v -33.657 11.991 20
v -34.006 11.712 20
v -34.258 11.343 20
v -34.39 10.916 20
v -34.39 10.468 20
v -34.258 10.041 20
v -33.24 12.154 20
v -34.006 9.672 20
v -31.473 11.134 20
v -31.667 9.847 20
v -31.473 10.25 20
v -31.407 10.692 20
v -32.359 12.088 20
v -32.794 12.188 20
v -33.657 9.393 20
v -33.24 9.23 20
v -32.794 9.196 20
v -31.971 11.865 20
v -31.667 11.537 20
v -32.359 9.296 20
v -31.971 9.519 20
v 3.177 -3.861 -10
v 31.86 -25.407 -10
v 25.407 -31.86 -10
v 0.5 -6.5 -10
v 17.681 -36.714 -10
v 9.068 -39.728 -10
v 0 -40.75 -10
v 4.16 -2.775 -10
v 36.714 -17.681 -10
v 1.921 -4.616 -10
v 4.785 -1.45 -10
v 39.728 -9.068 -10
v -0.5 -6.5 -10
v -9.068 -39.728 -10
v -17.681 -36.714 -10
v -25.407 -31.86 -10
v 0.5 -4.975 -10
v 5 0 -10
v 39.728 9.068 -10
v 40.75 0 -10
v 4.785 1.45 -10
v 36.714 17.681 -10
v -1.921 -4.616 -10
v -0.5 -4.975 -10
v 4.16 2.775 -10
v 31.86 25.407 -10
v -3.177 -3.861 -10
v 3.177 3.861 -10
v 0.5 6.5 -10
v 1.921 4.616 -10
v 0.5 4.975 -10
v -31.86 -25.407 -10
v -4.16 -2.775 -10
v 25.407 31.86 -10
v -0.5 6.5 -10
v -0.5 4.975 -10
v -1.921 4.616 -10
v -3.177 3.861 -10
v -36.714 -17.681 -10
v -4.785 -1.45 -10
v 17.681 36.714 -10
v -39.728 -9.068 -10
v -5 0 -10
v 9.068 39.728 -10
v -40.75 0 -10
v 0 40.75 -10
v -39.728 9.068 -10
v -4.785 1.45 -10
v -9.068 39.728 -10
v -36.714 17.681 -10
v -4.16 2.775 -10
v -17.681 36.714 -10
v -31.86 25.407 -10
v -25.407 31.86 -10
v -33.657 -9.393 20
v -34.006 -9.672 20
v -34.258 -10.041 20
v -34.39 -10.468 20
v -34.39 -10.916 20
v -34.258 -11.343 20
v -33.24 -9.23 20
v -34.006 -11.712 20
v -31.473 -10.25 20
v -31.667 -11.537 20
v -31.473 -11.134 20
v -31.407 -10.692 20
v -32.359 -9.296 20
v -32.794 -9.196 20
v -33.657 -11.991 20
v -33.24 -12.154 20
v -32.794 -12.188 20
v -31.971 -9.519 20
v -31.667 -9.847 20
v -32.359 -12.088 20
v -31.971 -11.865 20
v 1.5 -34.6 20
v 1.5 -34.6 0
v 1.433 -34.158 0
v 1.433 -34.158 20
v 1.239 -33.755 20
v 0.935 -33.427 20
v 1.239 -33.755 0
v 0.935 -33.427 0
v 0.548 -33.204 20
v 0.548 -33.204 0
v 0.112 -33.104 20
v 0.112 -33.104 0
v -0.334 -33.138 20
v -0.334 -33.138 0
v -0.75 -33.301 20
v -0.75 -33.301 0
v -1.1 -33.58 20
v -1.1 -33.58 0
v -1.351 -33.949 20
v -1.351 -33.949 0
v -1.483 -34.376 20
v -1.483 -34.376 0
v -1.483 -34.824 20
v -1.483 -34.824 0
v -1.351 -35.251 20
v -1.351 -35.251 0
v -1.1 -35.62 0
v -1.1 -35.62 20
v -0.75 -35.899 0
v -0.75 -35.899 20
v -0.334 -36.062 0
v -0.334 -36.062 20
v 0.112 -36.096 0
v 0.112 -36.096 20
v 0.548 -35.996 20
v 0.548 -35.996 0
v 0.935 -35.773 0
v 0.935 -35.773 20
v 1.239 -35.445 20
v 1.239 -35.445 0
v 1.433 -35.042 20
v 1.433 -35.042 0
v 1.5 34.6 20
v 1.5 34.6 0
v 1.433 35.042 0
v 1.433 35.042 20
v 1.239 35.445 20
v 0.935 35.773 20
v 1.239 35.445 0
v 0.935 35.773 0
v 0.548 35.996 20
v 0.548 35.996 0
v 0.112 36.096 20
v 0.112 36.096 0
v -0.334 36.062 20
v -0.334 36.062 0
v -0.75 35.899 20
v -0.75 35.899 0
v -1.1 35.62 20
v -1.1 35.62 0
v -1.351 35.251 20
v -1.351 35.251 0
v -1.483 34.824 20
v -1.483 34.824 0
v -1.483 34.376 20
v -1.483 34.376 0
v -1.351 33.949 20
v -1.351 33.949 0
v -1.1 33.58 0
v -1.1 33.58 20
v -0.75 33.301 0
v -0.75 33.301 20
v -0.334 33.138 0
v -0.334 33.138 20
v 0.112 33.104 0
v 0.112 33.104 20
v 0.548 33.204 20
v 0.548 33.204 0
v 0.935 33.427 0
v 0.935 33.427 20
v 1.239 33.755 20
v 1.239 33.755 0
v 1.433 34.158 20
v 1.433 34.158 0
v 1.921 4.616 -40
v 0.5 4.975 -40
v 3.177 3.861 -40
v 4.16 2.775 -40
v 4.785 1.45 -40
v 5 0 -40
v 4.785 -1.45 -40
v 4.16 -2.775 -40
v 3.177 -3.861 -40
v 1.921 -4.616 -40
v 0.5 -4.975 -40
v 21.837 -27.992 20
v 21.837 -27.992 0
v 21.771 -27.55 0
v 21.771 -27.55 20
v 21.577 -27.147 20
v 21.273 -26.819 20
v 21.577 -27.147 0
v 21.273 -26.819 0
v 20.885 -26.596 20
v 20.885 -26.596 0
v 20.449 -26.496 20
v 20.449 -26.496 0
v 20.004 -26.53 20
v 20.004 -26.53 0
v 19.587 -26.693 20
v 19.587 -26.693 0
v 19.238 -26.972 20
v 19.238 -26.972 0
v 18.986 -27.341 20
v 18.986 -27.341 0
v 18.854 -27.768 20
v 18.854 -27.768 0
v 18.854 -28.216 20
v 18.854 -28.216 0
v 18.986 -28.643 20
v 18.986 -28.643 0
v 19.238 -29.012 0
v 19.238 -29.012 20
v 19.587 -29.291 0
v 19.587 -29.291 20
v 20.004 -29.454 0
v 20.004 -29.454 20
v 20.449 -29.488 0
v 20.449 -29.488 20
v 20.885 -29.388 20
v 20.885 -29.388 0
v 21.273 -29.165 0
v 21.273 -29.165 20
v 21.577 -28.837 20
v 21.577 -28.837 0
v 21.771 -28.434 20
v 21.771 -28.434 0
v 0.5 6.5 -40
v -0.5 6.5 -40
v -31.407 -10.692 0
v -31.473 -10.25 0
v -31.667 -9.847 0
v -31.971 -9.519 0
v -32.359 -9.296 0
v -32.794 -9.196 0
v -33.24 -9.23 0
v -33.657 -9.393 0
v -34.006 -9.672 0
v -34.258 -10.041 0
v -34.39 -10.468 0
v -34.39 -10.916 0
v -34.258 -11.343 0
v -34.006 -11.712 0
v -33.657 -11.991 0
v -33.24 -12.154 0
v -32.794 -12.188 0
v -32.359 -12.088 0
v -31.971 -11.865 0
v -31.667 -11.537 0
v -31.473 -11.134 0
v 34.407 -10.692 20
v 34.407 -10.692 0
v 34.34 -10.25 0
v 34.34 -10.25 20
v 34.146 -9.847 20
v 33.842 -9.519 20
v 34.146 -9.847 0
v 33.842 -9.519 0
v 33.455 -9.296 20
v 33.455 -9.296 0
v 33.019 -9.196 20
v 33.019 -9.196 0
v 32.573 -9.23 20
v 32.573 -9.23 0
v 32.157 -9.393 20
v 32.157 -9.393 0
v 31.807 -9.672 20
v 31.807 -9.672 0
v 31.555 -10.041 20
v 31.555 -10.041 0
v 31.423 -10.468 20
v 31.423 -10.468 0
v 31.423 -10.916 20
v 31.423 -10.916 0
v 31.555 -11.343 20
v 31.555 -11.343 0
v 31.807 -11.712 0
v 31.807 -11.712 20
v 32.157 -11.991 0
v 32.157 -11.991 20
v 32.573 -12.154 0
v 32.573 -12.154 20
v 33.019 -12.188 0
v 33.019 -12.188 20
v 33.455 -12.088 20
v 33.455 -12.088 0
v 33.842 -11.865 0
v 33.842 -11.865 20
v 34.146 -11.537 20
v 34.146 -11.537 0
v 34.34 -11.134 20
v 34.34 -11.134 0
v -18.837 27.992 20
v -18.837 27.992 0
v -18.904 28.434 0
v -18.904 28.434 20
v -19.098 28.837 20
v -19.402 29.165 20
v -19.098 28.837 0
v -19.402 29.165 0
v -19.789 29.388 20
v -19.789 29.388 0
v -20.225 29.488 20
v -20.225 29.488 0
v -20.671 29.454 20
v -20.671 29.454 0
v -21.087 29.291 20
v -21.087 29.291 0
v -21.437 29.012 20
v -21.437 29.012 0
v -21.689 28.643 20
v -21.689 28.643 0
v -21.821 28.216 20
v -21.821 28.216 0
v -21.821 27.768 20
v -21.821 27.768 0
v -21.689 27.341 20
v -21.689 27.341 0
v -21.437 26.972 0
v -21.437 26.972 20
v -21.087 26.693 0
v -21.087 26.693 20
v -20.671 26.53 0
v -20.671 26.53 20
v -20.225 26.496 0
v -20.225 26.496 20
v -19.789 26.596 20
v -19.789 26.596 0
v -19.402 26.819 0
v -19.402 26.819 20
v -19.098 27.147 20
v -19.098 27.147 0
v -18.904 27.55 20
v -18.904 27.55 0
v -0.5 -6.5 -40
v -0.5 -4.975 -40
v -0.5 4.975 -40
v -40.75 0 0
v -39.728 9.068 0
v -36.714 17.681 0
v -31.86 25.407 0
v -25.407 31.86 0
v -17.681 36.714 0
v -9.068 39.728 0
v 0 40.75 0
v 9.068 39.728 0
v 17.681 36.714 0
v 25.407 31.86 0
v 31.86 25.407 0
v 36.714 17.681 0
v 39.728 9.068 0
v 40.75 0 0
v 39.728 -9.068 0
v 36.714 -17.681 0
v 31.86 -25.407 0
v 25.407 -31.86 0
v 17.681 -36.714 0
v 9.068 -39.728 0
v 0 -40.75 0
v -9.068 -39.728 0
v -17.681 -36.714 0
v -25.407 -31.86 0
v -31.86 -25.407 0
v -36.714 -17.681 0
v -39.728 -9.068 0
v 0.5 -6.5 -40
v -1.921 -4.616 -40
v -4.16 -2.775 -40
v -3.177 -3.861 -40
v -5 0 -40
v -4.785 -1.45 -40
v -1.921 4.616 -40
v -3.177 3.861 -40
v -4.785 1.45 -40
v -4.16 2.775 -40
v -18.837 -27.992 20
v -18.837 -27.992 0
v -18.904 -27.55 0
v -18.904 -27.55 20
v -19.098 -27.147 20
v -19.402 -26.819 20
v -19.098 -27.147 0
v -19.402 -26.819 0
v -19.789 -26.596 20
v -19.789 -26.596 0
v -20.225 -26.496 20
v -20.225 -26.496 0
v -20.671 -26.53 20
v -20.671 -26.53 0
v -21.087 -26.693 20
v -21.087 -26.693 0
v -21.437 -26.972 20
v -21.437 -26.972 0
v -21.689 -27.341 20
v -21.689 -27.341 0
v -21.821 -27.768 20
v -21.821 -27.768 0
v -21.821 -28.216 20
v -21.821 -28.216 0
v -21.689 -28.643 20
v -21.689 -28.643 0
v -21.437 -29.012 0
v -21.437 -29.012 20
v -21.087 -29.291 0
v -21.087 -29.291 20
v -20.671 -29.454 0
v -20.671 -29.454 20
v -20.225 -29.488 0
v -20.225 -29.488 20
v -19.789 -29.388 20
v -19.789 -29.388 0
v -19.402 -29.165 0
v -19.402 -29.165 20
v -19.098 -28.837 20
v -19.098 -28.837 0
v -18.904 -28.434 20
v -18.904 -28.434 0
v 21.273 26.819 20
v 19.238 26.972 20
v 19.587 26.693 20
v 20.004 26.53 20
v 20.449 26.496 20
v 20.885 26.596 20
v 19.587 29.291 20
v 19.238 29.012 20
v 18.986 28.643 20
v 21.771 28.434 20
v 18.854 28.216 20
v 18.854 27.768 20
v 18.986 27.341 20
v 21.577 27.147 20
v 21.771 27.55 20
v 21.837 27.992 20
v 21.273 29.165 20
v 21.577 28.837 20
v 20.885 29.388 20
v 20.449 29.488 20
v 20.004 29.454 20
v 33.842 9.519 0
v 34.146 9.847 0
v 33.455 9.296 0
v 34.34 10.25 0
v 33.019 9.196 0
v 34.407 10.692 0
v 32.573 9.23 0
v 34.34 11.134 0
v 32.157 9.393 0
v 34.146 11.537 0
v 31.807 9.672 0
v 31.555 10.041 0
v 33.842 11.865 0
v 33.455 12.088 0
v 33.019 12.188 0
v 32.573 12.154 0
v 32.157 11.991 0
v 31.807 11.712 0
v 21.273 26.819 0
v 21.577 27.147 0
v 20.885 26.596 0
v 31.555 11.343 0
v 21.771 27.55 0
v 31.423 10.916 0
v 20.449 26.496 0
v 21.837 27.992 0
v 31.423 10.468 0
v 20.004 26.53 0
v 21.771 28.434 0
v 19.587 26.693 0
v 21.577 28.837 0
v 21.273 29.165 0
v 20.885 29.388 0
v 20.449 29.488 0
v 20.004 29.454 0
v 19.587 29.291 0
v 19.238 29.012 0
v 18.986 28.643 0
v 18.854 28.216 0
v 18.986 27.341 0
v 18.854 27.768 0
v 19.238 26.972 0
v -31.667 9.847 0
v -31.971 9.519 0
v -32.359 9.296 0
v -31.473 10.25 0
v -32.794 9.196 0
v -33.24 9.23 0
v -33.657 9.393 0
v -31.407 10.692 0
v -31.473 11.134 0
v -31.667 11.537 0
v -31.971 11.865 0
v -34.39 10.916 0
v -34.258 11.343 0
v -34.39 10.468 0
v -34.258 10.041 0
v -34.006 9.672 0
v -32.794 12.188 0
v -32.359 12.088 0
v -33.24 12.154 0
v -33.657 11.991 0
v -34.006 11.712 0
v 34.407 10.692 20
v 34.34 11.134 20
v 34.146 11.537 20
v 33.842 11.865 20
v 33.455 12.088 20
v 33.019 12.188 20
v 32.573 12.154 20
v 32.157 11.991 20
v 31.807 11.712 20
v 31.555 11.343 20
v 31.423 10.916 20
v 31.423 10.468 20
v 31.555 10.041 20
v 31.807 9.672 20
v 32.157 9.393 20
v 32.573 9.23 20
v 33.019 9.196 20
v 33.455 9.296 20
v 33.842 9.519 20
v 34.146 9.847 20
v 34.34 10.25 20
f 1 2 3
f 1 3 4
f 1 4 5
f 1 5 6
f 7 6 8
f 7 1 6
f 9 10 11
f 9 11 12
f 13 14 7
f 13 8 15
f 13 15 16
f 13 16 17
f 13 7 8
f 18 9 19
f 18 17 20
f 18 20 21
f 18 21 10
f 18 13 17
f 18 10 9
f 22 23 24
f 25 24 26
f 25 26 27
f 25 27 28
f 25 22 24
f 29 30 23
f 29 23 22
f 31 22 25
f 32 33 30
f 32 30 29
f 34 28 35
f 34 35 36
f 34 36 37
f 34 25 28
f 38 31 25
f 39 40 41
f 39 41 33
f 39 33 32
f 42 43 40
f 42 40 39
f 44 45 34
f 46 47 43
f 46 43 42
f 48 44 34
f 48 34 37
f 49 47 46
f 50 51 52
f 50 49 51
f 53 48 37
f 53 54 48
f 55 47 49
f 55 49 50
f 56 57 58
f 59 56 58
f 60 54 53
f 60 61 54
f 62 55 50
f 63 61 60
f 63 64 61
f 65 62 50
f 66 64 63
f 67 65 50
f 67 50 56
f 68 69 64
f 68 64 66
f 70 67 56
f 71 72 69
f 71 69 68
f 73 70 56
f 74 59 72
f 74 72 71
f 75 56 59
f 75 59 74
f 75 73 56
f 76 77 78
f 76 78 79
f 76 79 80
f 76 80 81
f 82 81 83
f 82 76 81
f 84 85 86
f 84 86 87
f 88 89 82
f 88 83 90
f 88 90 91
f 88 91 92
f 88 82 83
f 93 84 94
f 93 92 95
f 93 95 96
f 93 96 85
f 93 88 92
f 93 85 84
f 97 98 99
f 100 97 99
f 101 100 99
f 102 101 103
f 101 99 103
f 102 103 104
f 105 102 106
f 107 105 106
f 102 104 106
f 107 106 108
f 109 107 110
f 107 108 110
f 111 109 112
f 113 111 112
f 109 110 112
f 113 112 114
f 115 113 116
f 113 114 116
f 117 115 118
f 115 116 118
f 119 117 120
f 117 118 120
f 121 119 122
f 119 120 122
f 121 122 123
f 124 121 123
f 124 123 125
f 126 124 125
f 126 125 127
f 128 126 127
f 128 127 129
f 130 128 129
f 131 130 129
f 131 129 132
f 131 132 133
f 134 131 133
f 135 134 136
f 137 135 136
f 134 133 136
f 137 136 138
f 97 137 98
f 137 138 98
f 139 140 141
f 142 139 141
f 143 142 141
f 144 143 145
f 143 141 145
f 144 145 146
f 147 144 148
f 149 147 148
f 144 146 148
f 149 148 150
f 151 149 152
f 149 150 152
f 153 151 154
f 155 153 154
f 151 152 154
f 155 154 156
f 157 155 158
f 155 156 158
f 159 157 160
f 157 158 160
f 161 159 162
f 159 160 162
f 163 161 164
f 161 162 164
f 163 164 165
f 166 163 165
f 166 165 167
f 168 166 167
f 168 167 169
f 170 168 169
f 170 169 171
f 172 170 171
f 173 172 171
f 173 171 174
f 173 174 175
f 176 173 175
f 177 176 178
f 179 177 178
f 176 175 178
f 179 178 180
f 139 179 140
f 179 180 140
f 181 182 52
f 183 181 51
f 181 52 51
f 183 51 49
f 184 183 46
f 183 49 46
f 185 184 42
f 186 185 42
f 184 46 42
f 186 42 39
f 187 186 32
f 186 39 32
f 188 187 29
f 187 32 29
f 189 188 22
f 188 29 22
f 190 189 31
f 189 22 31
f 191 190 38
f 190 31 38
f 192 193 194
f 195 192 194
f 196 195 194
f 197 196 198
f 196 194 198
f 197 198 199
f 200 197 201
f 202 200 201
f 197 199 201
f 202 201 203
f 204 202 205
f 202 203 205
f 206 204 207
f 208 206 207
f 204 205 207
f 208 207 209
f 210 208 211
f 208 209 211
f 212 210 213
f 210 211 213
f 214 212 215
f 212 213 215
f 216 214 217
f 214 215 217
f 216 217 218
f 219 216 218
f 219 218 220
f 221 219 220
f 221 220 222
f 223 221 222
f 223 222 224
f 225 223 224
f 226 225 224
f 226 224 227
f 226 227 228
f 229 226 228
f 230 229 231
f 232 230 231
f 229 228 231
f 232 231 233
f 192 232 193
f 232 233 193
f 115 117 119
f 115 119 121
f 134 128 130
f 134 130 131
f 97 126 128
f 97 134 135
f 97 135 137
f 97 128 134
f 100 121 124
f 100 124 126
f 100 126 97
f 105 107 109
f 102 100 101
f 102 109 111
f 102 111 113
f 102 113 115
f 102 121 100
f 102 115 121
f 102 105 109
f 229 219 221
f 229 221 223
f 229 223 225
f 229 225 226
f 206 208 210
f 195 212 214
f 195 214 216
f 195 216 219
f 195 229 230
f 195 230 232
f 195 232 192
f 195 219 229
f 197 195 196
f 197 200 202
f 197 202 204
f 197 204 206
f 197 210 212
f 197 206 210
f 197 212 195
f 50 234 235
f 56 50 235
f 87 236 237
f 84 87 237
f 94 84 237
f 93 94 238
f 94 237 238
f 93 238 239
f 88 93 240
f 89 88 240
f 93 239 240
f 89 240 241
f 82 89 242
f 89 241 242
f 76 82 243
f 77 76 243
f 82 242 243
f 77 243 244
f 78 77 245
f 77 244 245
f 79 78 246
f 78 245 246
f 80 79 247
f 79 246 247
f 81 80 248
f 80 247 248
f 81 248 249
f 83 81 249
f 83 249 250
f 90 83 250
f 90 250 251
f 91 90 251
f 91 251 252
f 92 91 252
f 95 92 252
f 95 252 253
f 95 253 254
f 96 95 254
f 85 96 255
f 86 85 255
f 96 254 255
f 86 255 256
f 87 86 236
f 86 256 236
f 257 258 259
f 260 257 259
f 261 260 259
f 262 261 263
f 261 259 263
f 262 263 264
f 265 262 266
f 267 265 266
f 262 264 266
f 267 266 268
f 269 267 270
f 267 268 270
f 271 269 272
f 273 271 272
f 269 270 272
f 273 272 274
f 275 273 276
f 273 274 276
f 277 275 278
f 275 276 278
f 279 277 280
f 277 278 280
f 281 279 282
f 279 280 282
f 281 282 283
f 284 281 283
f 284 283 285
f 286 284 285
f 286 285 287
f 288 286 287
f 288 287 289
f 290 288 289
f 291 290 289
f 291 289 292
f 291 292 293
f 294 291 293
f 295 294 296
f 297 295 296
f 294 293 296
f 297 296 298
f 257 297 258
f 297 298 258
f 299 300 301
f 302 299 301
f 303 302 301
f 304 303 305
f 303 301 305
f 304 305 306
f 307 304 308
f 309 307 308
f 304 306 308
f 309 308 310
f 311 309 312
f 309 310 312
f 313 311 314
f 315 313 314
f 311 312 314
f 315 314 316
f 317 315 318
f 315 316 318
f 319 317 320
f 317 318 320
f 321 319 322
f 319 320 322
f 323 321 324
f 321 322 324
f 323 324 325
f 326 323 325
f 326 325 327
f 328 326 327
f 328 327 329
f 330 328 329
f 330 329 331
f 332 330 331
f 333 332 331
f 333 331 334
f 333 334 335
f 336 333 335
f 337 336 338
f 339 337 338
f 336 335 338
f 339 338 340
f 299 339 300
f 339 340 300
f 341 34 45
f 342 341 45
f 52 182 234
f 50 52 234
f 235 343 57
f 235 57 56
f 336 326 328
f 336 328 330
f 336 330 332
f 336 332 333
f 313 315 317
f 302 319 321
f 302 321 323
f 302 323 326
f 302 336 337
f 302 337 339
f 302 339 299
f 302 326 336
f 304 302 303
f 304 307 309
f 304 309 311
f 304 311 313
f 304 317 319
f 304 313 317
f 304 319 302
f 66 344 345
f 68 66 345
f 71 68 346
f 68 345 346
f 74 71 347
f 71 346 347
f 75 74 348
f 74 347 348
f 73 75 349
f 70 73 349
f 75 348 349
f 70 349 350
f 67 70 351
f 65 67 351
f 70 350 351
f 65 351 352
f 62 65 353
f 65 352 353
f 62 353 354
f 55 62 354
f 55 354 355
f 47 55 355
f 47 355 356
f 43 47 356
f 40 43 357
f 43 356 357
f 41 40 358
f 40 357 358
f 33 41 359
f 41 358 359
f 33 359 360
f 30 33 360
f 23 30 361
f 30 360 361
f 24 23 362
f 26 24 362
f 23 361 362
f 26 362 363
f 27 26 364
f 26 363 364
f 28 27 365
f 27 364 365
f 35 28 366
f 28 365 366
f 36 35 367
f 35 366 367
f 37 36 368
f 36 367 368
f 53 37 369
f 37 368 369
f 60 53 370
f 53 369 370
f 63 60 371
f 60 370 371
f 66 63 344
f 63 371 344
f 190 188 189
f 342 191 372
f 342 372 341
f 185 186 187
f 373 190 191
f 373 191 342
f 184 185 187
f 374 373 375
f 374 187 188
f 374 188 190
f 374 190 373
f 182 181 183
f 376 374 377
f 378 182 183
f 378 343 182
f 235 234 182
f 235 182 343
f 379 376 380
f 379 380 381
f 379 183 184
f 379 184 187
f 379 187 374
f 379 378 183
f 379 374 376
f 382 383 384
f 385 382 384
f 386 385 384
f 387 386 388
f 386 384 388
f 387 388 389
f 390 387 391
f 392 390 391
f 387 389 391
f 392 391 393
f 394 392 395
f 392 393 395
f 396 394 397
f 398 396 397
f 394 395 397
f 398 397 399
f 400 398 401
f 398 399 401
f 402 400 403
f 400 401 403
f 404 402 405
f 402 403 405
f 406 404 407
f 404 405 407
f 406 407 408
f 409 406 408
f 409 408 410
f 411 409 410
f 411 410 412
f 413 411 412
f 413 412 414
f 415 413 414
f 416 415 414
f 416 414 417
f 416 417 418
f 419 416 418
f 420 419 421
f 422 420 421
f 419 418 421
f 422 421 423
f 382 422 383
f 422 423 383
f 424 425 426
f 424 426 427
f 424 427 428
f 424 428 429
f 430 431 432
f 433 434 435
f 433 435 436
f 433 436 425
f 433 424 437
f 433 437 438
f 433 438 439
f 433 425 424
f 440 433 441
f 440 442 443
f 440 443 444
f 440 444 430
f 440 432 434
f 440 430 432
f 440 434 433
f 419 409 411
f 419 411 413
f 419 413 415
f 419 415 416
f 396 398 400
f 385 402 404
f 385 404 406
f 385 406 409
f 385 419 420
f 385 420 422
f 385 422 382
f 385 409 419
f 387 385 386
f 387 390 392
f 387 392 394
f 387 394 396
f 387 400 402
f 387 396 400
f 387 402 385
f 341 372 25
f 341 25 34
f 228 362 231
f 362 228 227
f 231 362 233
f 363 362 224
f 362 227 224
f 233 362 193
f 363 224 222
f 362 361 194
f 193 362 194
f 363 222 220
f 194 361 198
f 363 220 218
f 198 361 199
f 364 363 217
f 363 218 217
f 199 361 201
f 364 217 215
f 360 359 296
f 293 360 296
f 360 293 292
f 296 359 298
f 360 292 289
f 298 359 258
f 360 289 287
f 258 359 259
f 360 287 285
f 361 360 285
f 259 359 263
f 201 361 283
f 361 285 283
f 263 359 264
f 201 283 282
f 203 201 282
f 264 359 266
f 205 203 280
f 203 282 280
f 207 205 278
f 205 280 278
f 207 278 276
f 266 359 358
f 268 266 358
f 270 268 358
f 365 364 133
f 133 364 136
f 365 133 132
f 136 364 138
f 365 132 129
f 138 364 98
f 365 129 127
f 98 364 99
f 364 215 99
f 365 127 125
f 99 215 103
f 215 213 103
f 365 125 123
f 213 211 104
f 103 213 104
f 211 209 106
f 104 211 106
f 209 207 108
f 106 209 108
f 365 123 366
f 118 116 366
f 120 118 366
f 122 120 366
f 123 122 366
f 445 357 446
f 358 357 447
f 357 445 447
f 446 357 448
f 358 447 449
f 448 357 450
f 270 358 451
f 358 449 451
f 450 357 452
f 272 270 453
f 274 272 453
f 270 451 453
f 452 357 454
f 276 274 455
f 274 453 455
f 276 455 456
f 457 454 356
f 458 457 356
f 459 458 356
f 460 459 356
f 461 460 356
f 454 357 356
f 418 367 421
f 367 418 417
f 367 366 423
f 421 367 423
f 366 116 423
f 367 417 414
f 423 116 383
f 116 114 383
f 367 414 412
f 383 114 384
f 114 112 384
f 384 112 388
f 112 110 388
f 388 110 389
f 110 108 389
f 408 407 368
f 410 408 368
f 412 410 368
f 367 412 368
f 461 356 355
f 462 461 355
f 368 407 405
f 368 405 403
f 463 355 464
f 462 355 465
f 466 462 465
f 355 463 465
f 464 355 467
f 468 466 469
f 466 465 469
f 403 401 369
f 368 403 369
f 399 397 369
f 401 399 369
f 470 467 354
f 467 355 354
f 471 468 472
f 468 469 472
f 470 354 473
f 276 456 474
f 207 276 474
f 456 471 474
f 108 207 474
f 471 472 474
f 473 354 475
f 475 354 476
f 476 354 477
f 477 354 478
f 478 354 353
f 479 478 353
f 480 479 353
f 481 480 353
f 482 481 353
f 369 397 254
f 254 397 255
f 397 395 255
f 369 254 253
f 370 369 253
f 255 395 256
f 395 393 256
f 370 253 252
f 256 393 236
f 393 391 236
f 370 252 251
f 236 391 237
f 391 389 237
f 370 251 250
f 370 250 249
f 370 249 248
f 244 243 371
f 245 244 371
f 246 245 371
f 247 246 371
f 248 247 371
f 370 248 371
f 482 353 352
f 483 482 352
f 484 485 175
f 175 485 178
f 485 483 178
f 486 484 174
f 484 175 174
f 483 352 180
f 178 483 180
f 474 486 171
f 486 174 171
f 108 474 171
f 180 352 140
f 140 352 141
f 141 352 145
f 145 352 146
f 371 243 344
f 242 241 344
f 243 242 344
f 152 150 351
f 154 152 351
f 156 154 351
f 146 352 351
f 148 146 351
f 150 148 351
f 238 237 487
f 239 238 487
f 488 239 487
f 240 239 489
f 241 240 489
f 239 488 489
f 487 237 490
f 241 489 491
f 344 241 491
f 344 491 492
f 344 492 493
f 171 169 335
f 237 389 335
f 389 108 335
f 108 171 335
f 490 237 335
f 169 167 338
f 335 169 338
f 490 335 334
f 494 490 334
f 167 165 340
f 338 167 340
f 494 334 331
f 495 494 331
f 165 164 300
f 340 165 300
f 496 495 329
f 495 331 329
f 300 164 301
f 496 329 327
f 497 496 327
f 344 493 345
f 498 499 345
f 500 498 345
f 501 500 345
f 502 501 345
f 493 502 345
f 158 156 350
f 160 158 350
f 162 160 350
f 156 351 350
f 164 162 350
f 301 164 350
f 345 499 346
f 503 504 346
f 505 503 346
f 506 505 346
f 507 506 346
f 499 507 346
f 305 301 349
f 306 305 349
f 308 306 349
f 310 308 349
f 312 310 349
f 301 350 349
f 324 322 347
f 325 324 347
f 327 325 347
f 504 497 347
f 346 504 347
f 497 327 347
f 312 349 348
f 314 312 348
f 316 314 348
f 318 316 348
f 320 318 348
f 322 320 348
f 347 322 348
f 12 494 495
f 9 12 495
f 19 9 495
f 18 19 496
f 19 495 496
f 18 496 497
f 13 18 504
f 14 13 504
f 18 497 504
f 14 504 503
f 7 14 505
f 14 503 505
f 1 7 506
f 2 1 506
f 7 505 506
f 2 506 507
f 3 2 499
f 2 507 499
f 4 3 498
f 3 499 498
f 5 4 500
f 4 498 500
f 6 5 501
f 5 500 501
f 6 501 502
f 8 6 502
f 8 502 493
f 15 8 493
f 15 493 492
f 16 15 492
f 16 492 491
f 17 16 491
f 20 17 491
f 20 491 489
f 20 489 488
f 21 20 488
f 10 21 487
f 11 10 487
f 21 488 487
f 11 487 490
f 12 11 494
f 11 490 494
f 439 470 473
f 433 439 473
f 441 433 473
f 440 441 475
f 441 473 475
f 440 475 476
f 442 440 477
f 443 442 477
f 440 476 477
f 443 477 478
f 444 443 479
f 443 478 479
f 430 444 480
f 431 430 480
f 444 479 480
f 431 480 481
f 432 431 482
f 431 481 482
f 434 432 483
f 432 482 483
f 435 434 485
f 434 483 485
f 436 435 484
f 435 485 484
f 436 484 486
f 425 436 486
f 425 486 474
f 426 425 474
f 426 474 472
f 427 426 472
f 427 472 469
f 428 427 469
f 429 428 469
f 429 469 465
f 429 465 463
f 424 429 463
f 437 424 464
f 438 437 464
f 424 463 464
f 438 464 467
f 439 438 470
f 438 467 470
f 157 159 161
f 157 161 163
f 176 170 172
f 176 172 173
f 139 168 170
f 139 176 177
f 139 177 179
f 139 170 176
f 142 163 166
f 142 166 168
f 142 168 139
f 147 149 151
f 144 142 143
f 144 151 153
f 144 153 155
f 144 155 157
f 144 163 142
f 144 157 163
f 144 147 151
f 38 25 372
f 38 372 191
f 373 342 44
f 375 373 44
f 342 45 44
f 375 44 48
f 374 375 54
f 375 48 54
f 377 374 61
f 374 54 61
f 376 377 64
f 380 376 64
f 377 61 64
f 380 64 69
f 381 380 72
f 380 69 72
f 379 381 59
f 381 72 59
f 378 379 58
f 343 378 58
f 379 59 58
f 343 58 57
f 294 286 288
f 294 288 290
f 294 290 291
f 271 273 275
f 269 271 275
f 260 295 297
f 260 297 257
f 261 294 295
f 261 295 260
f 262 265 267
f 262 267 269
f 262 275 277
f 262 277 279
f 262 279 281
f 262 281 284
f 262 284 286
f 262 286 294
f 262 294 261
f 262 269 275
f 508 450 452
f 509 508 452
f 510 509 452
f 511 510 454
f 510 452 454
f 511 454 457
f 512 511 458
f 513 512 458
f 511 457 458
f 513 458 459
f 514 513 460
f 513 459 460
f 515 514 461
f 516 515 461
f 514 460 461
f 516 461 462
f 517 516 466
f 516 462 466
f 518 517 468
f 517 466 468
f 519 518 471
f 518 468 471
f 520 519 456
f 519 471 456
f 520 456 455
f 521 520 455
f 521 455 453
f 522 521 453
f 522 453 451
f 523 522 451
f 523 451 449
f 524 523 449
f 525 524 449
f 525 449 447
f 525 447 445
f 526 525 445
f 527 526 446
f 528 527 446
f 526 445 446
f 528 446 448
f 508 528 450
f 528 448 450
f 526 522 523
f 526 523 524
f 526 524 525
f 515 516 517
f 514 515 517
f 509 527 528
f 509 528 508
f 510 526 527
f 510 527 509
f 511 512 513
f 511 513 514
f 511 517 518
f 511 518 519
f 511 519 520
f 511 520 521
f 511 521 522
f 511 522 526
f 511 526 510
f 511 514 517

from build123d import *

# Parameters (mm, degrees)
SKETCH1_R              = 1.5
BOSS_EXTRUDE1_DEPTH    = 20
BOSS_EXTRUDE1_2_DEPTH  = 20
BOSS_EXTRUDE1_3_DEPTH  = 20
BOSS_EXTRUDE1_4_DEPTH  = 20
BOSS_EXTRUDE1_5_DEPTH  = 20
BOSS_EXTRUDE1_6_DEPTH  = 20
BOSS_EXTRUDE1_7_DEPTH  = 20
BOSS_EXTRUDE1_8_DEPTH  = 20
BOSS_EXTRUDE1_9_DEPTH  = 20
BOSS_EXTRUDE1_10_DEPTH = 20
SKETCH2_R              = 40.75
BOSS_EXTRUDE2_DEPTH    = 10
SKETCH3_R              = 5
BOSS_EXTRUDE3_DEPTH    = 30
SKETCH4_W              = 1
SKETCH4_H              = 2
BOSS_EXTRUDE4_DEPTH    = 30


with BuildPart() as part:
    # Sketch1 → Boss-Extrude1 (new body)
    with BuildSketch(Plane.XY):
        with Locations((0, 34.6)):
            Circle(SKETCH1_R)
    extrude(amount=BOSS_EXTRUDE1_DEPTH)



with BuildPart() as body_2:
    # Sketch1 → Boss-Extrude1 2 (new body)
    with BuildSketch(Plane.XY):
        with Locations((20.337369729, 27.991988005)):
            Circle(SKETCH1_R)
    extrude(amount=BOSS_EXTRUDE1_2_DEPTH)


with BuildPart() as body_3:
    # Sketch1 → Boss-Extrude1 3 (new body)
    with BuildSketch(Plane.XY):
        with Locations((32.906555464, 10.691988005)):
            Circle(SKETCH1_R)
    extrude(amount=BOSS_EXTRUDE1_3_DEPTH)


with BuildPart() as body_4:
    # Sketch1 → Boss-Extrude1 4 (new body)
    with BuildSketch(Plane.XY):
        with Locations((32.906555464, -10.691988005)):
            Circle(SKETCH1_R)
    extrude(amount=BOSS_EXTRUDE1_4_DEPTH)


with BuildPart() as body_5:
    # Sketch1 → Boss-Extrude1 5 (new body)
    with BuildSketch(Plane.XY):
        with Locations((20.337369729, -27.991988005)):
            Circle(SKETCH1_R)
    extrude(amount=BOSS_EXTRUDE1_5_DEPTH)


with BuildPart() as body_6:
    # Sketch1 → Boss-Extrude1 6 (new body)
    with BuildSketch(Plane.XY):
        with Locations((0, -34.6)):
            Circle(SKETCH1_R)
    extrude(amount=BOSS_EXTRUDE1_6_DEPTH)


with BuildPart() as body_7:
    # Sketch1 → Boss-Extrude1 7 (new body)
    with BuildSketch(Plane.XY):
        with Locations((-20.337369729, -27.991988005)):
            Circle(SKETCH1_R)
    extrude(amount=BOSS_EXTRUDE1_7_DEPTH)


with BuildPart() as body_8:
    # Sketch1 → Boss-Extrude1 8 (new body)
    with BuildSketch(Plane.XY):
        with Locations((-32.906555464, -10.691988005)):
            Circle(SKETCH1_R)
    extrude(amount=BOSS_EXTRUDE1_8_DEPTH)


with BuildPart() as body_9:
    # Sketch1 → Boss-Extrude1 9 (new body)
    with BuildSketch(Plane.XY):
        with Locations((-32.906555464, 10.691988005)):
            Circle(SKETCH1_R)
    extrude(amount=BOSS_EXTRUDE1_9_DEPTH)


with BuildPart() as body_10:
    # Sketch1 → Boss-Extrude1 10 (new body)
    with BuildSketch(Plane.XY):
        with Locations((-20.337369729, 27.991988005)):
            Circle(SKETCH1_R)
    extrude(amount=BOSS_EXTRUDE1_10_DEPTH)


with BuildPart() as part_1:
    add(part.part)

    add(body_2.part)  # Boss-Extrude2 merges body 2

    add(body_3.part)  # Boss-Extrude2 merges body 3

    add(body_4.part)  # Boss-Extrude2 merges body 4

    add(body_5.part)  # Boss-Extrude2 merges body 5

    add(body_6.part)  # Boss-Extrude2 merges body 6

    add(body_7.part)  # Boss-Extrude2 merges body 7

    add(body_8.part)  # Boss-Extrude2 merges body 8

    add(body_9.part)  # Boss-Extrude2 merges body 9

    add(body_10.part)  # Boss-Extrude2 merges body 10
    # Sketch2 → Boss-Extrude2 (add)
    with BuildSketch(Plane(origin=(0, 0, 0), x_dir=(-1, 0, 0), z_dir=(0, 0, -1))):
        Circle(SKETCH2_R)
    extrude(amount=BOSS_EXTRUDE2_DEPTH)

    # Sketch3 → Boss-Extrude3 (add)
    with BuildSketch(Plane(origin=(0, 0, -10), x_dir=(-1, 0, 0), z_dir=(0, 0, -1))):
        Circle(SKETCH3_R)
    extrude(amount=BOSS_EXTRUDE3_DEPTH)

    # Sketch4 → Boss-Extrude4 (add)
    with BuildSketch(Plane(origin=(0, 0, -40), x_dir=(-1, 0, 0), z_dir=(0, 0, -1))):
        with Locations((0, 5.5)):
            Rectangle(SKETCH4_W, SKETCH4_H)
        with Locations((0, -5.5)):
            Rectangle(SKETCH4_W, SKETCH4_H)
    extrude(amount=-BOSS_EXTRUDE4_DEPTH)


solid = part_1.part
